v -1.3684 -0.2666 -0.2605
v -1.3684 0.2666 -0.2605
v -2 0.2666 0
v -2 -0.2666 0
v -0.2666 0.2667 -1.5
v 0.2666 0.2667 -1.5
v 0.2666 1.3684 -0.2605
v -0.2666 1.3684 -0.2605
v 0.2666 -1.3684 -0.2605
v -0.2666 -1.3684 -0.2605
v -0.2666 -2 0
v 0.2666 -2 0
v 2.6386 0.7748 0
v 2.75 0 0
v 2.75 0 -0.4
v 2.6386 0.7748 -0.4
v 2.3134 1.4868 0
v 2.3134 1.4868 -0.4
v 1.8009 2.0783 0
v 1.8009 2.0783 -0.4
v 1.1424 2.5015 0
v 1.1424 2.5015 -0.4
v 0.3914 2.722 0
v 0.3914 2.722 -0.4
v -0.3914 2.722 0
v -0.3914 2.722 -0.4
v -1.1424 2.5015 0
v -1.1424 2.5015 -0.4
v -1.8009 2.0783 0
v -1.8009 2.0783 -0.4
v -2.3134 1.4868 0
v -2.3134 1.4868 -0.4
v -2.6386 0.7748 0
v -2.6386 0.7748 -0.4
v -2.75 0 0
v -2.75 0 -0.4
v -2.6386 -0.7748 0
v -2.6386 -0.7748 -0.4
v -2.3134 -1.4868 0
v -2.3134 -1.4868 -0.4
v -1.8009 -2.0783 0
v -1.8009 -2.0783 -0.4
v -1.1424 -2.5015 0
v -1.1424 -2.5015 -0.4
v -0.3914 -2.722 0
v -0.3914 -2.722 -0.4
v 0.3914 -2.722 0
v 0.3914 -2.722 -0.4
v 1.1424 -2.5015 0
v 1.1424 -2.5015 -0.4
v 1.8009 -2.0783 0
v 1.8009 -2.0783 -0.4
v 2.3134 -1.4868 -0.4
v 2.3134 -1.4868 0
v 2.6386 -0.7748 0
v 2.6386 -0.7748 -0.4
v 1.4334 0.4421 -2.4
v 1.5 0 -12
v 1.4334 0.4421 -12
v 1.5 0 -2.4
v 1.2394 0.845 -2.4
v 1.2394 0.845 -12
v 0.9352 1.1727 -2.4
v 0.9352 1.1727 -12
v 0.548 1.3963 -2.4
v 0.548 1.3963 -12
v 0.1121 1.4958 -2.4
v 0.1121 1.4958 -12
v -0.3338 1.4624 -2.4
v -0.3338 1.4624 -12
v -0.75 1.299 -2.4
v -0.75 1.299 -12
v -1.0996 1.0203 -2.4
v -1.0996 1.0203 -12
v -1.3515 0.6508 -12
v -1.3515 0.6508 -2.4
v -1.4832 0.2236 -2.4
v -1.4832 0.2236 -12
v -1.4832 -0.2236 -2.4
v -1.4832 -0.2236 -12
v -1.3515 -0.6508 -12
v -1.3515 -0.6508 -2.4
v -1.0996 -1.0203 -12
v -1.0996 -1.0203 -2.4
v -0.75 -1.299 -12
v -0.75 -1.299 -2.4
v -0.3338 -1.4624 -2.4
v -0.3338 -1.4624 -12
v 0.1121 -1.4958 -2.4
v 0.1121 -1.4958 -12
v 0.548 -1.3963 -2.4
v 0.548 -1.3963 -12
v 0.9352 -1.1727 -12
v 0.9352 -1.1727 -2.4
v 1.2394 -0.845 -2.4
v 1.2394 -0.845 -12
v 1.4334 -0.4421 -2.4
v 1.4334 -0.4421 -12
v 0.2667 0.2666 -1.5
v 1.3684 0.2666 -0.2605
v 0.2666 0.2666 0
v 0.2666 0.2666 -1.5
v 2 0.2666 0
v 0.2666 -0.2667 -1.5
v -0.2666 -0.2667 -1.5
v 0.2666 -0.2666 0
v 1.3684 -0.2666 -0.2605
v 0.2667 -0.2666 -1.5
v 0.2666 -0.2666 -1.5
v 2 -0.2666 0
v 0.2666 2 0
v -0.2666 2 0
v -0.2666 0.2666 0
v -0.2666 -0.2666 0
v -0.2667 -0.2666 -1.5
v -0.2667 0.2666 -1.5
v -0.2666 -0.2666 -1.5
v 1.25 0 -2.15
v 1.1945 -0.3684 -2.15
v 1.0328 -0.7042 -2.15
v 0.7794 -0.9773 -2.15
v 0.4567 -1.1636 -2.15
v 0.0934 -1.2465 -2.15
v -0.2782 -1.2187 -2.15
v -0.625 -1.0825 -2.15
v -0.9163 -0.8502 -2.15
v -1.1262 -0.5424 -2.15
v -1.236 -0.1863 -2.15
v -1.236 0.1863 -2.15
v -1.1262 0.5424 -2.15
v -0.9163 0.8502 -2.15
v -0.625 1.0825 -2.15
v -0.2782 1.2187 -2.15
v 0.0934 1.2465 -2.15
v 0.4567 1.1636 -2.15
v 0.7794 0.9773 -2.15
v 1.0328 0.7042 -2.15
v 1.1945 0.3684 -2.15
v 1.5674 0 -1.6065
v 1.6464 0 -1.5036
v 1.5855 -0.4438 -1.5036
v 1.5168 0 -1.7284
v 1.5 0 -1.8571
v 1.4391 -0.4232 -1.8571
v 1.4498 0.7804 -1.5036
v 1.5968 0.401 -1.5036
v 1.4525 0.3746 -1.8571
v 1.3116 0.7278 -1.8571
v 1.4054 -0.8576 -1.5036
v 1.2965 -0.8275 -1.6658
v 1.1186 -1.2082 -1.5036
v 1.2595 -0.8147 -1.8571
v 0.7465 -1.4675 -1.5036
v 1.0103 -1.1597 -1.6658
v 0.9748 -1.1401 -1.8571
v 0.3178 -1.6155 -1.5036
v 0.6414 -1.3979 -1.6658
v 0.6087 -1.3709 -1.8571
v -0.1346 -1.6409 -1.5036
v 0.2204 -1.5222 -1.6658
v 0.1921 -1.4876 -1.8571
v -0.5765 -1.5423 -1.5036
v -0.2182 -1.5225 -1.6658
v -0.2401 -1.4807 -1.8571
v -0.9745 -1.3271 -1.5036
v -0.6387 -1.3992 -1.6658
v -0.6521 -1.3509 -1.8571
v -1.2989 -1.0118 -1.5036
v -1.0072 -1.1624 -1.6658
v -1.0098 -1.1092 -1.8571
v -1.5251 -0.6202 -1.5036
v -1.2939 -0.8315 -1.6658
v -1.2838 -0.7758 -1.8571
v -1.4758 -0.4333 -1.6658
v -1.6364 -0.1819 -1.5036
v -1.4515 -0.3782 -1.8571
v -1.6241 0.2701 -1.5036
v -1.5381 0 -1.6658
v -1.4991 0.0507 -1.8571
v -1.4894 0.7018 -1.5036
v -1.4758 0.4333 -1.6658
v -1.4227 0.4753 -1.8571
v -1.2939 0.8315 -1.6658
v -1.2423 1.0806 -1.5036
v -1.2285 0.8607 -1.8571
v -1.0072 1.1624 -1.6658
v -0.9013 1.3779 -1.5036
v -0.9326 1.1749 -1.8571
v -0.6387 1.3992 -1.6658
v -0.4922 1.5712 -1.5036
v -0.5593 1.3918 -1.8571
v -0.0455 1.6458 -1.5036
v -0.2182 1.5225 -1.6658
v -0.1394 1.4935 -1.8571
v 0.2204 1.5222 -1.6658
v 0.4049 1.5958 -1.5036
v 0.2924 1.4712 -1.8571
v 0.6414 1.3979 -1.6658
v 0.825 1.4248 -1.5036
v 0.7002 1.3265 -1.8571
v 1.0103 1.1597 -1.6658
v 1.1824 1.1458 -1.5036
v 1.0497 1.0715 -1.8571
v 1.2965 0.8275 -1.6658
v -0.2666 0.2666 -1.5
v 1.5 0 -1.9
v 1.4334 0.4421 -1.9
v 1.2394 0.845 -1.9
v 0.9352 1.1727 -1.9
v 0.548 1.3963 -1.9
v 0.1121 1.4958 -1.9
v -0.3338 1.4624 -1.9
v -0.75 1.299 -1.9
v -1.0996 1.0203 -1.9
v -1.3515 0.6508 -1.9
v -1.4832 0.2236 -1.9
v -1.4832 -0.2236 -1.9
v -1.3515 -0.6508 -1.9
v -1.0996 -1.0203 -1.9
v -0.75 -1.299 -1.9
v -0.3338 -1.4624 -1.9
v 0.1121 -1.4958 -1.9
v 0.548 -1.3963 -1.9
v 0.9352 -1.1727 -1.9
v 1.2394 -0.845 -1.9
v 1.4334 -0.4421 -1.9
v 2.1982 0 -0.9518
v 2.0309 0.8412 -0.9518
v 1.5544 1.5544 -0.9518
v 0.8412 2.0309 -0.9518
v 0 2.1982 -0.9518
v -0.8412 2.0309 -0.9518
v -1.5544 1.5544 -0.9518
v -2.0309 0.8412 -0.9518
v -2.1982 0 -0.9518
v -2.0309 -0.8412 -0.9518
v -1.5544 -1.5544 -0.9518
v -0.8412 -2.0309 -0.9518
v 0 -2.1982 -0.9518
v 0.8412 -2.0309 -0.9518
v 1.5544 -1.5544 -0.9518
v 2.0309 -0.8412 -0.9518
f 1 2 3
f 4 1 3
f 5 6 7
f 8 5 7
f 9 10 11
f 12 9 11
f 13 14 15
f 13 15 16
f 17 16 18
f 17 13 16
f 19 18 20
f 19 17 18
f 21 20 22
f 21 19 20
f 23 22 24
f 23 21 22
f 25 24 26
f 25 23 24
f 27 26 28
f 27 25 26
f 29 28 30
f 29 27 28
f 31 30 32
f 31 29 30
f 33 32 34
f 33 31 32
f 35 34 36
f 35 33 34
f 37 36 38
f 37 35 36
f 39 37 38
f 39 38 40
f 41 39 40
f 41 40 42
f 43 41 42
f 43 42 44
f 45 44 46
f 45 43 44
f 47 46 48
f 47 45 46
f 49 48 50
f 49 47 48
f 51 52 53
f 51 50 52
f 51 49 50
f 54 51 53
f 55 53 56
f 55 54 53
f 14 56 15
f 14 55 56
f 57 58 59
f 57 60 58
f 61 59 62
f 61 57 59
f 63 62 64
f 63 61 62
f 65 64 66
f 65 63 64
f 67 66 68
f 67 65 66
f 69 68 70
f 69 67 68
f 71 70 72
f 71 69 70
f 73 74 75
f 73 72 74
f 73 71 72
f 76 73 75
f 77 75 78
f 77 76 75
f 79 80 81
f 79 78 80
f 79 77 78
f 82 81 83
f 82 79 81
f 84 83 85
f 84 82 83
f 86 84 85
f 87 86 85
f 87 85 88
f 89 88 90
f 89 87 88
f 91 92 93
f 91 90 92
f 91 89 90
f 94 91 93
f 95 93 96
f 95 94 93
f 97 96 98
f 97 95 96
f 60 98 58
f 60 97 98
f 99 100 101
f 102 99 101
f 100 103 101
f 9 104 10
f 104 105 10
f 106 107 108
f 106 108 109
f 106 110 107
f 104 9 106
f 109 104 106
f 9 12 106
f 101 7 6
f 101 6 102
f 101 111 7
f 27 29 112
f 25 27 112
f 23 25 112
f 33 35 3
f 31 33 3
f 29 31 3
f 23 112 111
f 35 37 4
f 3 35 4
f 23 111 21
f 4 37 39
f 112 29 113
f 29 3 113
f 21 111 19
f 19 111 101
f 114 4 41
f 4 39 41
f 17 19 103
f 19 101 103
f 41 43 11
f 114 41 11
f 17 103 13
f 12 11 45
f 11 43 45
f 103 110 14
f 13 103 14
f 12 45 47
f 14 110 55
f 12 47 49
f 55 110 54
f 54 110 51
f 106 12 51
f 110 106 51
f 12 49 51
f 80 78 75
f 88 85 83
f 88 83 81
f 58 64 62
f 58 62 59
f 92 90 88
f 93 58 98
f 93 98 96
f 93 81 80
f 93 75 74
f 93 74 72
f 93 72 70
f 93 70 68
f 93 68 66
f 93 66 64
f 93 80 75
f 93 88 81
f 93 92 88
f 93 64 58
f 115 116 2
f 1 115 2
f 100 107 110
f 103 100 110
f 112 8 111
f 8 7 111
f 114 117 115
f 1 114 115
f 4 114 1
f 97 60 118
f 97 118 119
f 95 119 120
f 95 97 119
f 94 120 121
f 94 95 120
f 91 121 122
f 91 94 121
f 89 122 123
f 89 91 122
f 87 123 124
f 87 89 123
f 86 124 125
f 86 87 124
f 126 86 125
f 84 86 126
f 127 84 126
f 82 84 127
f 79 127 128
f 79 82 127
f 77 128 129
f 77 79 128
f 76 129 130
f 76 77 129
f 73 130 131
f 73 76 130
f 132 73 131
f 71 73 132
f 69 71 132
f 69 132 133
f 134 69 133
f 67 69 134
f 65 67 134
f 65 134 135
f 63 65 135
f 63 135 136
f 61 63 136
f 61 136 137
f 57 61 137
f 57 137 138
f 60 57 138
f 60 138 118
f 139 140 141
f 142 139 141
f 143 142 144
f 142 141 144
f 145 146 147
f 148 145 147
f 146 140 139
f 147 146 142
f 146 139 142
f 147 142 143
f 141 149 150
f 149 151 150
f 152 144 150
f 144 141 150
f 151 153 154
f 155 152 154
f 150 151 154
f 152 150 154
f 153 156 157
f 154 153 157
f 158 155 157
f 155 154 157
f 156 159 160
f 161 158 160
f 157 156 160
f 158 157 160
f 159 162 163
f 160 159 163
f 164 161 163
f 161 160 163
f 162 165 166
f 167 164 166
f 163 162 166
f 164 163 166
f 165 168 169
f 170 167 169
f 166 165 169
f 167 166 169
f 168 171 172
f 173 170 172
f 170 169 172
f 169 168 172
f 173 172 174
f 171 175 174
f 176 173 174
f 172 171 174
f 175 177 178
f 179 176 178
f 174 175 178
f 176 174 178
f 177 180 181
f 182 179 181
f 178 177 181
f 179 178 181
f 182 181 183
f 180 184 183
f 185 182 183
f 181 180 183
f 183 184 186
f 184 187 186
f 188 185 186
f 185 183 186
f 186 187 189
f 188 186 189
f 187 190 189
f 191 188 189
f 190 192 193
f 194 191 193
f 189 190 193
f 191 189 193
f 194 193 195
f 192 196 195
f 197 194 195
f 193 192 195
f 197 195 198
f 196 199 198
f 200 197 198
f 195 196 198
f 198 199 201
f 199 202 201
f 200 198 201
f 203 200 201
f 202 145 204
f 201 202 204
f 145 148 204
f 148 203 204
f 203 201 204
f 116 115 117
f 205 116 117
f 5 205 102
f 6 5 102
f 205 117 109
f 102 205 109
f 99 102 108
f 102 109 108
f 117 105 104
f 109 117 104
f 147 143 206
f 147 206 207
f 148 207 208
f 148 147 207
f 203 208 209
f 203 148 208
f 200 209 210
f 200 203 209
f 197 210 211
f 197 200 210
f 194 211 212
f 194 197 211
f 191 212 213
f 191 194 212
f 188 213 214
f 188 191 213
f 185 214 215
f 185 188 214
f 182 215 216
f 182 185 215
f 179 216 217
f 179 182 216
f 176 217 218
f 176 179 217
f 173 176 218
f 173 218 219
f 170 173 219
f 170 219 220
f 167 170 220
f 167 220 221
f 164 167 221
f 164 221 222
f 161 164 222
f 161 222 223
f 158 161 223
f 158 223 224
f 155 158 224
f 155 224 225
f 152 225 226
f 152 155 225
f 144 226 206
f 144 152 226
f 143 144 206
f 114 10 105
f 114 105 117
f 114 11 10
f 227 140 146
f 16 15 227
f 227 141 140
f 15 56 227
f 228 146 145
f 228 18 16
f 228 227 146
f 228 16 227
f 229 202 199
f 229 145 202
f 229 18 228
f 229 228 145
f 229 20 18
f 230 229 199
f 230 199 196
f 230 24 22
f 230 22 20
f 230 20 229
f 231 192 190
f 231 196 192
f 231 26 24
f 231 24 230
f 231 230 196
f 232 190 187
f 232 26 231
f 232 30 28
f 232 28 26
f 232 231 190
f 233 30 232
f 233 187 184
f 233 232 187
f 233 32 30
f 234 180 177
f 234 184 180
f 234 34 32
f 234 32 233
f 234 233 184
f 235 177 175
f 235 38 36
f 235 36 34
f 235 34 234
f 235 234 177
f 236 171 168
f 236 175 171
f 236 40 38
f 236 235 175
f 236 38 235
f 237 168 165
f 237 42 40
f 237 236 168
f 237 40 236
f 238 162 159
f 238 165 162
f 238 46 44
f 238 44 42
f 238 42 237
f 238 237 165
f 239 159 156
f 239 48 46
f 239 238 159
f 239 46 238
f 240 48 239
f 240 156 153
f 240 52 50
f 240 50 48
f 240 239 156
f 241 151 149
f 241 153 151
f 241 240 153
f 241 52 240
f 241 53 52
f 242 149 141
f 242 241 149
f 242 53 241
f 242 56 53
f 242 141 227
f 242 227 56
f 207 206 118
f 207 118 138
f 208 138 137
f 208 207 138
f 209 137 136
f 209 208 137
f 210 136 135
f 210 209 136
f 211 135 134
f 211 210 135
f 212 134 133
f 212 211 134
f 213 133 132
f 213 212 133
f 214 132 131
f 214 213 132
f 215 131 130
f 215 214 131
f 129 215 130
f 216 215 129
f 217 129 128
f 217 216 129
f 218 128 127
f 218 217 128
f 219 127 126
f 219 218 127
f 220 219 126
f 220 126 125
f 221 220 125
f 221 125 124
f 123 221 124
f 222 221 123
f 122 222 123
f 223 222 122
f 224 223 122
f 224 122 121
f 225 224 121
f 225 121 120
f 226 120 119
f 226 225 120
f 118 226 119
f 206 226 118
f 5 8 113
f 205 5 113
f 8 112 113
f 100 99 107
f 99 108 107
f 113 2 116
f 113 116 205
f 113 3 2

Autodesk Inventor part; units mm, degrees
ref_plane "YZ Plane" through (0, 0, 0) normal (1, 0, 0) x (0, 1, 0)
sketch "Esquisse1" plane through (0, 0, 0) normal (0, 1, 0) x (-1, 0, 0)
  point P0 (0, 0)
sketch "Esquisse2" plane through (0, 0, 0) normal (0, 0, 1) x (1, 0, 0)
  point P0 (0, 0)
sketch "Esquisse3" plane through (0, 0, 0) normal (0, 0, 1) x (1, 0, 0)
  point P0 (0, 0)
sketch "Esquisse4" plane through (0, 0, 0) normal (0, 1, 0) x (-1, 0, 0)
  line L0 (-2.75, 0) -> (0, 0)
  line L1 (-2.75, -0.4) -> (-2.75, 0)
  line L2 (-1.5, -1.65) -> (-2.75, -0.4)
  line L3 (-1.5, -1.9) -> (-1.5, -1.65)
  line L4 (-1.25, -2.15) -> (-1.5, -1.9)
  line L5 (-1.5, -2.4) -> (-1.25, -2.15)
  line L6 (-1.5, -12) -> (-1.5, -2.4)
  line L7 (0, 0) -> (0, -12)
  line L8 (0, 3.3392) -> (0, -10.7) construction
  line L9 (0, 3.3392) -> (0, -10.7)
  line L10 (0, -15.0678) -> (0, 6.4071) projected
  line L11 (-1.5, -12) -> (0, -12)
  line L12 (0.55, 0) -> (-3.3, 0) projected
  dimension "d3" = 2.75
  dimension "d5" = 0.25
  dimension "d7" = 0.25
  dimension "d9" = 0.25
  dimension "d11" = 1.65
  dimension "d13" = 135
  dimension "d17" = 1.25
  dimension "d19" = 0
  dimension "d51" = 1.5
  dimension "d52" = 12
revolve "Révolution1" add sketch "Esquisse4" angle 360 about axis through (0, 0, 3.3392) along (0, 0, -1)
sketch "Esquisse5" plane through (0, 0, 0) normal (0, 1, 0) x (-1, 0, 0)
  line L0 (-1.6, 0) -> (0, 0)
  line L1 (-0.2667, -1.5) -> (-1.6, 0)
  line L2 (0, -1.5) -> (-0.2667, -1.5)
  line L3 (0, 0) -> (0, -1.5)
  line L4 (-1.5, -1.65) -> (1.5, -1.65) construction
  line L5 (-2.75, 0) -> (2.75, 0) projected
  line L6 (0, -1.98) -> (0, 0.33) projected
  dimension "d22" = 1.6
  dimension "d24" = 0.2667
  dimension "d26" = 1.5
extrude "Extrusion1" cut sketch "Esquisse5" along normal mid plane 0.5333
pattern_circular "RéseauPolaire1" count 4 over 360 about axis through (0, 0, 0) along (0, 0, 1) of "Extrusion1"
sketch "Esquisse7" plane through (0, 0, 0) normal (0, 1, 0) x (-1, 0, 0)
  line L0 (0, -0.825) -> (-2, 0)
  line L1 (0, 0) -> (0, -0.825)
  line L2 (-2, 0) -> (0, 0)
  line L3 (-1.5, -1.65) -> (1.5, -1.65) construction
  line L4 (0, -1.98) -> (0, 0.33) projected
  line L5 (-2.75, 0) -> (2.75, 0) projected
  dimension "d33" = 2
  dimension "d35" = 0.825
extrude "Extrusion2" cut sketch "Esquisse7" along normal mid plane 0.5333
pattern_circular "RéseauPolaire2" count 4 over 360 about axis through (0, 0, 0) along (0, 0, 1) of "Extrusion2"
fillet "Congé1" radius 0.5 1 edges at (-1.5, 0, -1.65)
thread "Filetage1" size "M3x0.5" class "6g" standard "ISO Metric profile" full length
ref_plane "MSC_PF1" through (0, 0, 0) normal (1, 0, 0) x (0, 1, 0)
ref_plane "MSC_PT1" through (0, 0, 0) normal (0, 0, -1) x (-1, 0, 0)
equation "\"d3\" = 0.5 * Dh"
equation "\"d5\" = msp_x"
equation "\"d7\" = ParA"
equation "\"d9\" = msp_x"
equation "\"d11\" = ParK"
equation "\"d17\" = 0.5 * msp_mdtds"
equation "\"d51\" = 0.5 * NND"
equation "\"d52\" = NLG"
equation "\"d22\" = 0.5 * M"
equation "\"d24\" = 0.0833333 * M"
equation "\"d26\" = 0.909091 * ParK"
equation "\"d27\" = 0.166667 * M"
equation "\"d33\" = 0.625 * M"
equation "\"d35\" = 0.5 * ParK"
equation "\"d36\" = 0.166667 * M"
equation "\"d41\" = 2 * msp_x"
equation "\"PTC\" = 0.5"
equation "\"NLG\" = 12"
equation "\"ParK\" = 1.65"
equation "\"NND\" = 3"
equation "\"M\" = 3.2"
equation "\"msp_mdtds\" = NND - PTC"
equation "\"Dh\" = 5.5"
equation "\"msp_x\" = 0.5 * PTC"
equation "\"ParA\" = 0.5 * PTC"
equation "\"r\" = 0.8"
equation "\"THREADDIA\" = NND"
equation "\"TEMPLATE\" = 1.2345"
properties part number "NF EN ISO 7046-2 H - M3x12 - 8.8 - H1" material "Acier inoxydable 440C"
